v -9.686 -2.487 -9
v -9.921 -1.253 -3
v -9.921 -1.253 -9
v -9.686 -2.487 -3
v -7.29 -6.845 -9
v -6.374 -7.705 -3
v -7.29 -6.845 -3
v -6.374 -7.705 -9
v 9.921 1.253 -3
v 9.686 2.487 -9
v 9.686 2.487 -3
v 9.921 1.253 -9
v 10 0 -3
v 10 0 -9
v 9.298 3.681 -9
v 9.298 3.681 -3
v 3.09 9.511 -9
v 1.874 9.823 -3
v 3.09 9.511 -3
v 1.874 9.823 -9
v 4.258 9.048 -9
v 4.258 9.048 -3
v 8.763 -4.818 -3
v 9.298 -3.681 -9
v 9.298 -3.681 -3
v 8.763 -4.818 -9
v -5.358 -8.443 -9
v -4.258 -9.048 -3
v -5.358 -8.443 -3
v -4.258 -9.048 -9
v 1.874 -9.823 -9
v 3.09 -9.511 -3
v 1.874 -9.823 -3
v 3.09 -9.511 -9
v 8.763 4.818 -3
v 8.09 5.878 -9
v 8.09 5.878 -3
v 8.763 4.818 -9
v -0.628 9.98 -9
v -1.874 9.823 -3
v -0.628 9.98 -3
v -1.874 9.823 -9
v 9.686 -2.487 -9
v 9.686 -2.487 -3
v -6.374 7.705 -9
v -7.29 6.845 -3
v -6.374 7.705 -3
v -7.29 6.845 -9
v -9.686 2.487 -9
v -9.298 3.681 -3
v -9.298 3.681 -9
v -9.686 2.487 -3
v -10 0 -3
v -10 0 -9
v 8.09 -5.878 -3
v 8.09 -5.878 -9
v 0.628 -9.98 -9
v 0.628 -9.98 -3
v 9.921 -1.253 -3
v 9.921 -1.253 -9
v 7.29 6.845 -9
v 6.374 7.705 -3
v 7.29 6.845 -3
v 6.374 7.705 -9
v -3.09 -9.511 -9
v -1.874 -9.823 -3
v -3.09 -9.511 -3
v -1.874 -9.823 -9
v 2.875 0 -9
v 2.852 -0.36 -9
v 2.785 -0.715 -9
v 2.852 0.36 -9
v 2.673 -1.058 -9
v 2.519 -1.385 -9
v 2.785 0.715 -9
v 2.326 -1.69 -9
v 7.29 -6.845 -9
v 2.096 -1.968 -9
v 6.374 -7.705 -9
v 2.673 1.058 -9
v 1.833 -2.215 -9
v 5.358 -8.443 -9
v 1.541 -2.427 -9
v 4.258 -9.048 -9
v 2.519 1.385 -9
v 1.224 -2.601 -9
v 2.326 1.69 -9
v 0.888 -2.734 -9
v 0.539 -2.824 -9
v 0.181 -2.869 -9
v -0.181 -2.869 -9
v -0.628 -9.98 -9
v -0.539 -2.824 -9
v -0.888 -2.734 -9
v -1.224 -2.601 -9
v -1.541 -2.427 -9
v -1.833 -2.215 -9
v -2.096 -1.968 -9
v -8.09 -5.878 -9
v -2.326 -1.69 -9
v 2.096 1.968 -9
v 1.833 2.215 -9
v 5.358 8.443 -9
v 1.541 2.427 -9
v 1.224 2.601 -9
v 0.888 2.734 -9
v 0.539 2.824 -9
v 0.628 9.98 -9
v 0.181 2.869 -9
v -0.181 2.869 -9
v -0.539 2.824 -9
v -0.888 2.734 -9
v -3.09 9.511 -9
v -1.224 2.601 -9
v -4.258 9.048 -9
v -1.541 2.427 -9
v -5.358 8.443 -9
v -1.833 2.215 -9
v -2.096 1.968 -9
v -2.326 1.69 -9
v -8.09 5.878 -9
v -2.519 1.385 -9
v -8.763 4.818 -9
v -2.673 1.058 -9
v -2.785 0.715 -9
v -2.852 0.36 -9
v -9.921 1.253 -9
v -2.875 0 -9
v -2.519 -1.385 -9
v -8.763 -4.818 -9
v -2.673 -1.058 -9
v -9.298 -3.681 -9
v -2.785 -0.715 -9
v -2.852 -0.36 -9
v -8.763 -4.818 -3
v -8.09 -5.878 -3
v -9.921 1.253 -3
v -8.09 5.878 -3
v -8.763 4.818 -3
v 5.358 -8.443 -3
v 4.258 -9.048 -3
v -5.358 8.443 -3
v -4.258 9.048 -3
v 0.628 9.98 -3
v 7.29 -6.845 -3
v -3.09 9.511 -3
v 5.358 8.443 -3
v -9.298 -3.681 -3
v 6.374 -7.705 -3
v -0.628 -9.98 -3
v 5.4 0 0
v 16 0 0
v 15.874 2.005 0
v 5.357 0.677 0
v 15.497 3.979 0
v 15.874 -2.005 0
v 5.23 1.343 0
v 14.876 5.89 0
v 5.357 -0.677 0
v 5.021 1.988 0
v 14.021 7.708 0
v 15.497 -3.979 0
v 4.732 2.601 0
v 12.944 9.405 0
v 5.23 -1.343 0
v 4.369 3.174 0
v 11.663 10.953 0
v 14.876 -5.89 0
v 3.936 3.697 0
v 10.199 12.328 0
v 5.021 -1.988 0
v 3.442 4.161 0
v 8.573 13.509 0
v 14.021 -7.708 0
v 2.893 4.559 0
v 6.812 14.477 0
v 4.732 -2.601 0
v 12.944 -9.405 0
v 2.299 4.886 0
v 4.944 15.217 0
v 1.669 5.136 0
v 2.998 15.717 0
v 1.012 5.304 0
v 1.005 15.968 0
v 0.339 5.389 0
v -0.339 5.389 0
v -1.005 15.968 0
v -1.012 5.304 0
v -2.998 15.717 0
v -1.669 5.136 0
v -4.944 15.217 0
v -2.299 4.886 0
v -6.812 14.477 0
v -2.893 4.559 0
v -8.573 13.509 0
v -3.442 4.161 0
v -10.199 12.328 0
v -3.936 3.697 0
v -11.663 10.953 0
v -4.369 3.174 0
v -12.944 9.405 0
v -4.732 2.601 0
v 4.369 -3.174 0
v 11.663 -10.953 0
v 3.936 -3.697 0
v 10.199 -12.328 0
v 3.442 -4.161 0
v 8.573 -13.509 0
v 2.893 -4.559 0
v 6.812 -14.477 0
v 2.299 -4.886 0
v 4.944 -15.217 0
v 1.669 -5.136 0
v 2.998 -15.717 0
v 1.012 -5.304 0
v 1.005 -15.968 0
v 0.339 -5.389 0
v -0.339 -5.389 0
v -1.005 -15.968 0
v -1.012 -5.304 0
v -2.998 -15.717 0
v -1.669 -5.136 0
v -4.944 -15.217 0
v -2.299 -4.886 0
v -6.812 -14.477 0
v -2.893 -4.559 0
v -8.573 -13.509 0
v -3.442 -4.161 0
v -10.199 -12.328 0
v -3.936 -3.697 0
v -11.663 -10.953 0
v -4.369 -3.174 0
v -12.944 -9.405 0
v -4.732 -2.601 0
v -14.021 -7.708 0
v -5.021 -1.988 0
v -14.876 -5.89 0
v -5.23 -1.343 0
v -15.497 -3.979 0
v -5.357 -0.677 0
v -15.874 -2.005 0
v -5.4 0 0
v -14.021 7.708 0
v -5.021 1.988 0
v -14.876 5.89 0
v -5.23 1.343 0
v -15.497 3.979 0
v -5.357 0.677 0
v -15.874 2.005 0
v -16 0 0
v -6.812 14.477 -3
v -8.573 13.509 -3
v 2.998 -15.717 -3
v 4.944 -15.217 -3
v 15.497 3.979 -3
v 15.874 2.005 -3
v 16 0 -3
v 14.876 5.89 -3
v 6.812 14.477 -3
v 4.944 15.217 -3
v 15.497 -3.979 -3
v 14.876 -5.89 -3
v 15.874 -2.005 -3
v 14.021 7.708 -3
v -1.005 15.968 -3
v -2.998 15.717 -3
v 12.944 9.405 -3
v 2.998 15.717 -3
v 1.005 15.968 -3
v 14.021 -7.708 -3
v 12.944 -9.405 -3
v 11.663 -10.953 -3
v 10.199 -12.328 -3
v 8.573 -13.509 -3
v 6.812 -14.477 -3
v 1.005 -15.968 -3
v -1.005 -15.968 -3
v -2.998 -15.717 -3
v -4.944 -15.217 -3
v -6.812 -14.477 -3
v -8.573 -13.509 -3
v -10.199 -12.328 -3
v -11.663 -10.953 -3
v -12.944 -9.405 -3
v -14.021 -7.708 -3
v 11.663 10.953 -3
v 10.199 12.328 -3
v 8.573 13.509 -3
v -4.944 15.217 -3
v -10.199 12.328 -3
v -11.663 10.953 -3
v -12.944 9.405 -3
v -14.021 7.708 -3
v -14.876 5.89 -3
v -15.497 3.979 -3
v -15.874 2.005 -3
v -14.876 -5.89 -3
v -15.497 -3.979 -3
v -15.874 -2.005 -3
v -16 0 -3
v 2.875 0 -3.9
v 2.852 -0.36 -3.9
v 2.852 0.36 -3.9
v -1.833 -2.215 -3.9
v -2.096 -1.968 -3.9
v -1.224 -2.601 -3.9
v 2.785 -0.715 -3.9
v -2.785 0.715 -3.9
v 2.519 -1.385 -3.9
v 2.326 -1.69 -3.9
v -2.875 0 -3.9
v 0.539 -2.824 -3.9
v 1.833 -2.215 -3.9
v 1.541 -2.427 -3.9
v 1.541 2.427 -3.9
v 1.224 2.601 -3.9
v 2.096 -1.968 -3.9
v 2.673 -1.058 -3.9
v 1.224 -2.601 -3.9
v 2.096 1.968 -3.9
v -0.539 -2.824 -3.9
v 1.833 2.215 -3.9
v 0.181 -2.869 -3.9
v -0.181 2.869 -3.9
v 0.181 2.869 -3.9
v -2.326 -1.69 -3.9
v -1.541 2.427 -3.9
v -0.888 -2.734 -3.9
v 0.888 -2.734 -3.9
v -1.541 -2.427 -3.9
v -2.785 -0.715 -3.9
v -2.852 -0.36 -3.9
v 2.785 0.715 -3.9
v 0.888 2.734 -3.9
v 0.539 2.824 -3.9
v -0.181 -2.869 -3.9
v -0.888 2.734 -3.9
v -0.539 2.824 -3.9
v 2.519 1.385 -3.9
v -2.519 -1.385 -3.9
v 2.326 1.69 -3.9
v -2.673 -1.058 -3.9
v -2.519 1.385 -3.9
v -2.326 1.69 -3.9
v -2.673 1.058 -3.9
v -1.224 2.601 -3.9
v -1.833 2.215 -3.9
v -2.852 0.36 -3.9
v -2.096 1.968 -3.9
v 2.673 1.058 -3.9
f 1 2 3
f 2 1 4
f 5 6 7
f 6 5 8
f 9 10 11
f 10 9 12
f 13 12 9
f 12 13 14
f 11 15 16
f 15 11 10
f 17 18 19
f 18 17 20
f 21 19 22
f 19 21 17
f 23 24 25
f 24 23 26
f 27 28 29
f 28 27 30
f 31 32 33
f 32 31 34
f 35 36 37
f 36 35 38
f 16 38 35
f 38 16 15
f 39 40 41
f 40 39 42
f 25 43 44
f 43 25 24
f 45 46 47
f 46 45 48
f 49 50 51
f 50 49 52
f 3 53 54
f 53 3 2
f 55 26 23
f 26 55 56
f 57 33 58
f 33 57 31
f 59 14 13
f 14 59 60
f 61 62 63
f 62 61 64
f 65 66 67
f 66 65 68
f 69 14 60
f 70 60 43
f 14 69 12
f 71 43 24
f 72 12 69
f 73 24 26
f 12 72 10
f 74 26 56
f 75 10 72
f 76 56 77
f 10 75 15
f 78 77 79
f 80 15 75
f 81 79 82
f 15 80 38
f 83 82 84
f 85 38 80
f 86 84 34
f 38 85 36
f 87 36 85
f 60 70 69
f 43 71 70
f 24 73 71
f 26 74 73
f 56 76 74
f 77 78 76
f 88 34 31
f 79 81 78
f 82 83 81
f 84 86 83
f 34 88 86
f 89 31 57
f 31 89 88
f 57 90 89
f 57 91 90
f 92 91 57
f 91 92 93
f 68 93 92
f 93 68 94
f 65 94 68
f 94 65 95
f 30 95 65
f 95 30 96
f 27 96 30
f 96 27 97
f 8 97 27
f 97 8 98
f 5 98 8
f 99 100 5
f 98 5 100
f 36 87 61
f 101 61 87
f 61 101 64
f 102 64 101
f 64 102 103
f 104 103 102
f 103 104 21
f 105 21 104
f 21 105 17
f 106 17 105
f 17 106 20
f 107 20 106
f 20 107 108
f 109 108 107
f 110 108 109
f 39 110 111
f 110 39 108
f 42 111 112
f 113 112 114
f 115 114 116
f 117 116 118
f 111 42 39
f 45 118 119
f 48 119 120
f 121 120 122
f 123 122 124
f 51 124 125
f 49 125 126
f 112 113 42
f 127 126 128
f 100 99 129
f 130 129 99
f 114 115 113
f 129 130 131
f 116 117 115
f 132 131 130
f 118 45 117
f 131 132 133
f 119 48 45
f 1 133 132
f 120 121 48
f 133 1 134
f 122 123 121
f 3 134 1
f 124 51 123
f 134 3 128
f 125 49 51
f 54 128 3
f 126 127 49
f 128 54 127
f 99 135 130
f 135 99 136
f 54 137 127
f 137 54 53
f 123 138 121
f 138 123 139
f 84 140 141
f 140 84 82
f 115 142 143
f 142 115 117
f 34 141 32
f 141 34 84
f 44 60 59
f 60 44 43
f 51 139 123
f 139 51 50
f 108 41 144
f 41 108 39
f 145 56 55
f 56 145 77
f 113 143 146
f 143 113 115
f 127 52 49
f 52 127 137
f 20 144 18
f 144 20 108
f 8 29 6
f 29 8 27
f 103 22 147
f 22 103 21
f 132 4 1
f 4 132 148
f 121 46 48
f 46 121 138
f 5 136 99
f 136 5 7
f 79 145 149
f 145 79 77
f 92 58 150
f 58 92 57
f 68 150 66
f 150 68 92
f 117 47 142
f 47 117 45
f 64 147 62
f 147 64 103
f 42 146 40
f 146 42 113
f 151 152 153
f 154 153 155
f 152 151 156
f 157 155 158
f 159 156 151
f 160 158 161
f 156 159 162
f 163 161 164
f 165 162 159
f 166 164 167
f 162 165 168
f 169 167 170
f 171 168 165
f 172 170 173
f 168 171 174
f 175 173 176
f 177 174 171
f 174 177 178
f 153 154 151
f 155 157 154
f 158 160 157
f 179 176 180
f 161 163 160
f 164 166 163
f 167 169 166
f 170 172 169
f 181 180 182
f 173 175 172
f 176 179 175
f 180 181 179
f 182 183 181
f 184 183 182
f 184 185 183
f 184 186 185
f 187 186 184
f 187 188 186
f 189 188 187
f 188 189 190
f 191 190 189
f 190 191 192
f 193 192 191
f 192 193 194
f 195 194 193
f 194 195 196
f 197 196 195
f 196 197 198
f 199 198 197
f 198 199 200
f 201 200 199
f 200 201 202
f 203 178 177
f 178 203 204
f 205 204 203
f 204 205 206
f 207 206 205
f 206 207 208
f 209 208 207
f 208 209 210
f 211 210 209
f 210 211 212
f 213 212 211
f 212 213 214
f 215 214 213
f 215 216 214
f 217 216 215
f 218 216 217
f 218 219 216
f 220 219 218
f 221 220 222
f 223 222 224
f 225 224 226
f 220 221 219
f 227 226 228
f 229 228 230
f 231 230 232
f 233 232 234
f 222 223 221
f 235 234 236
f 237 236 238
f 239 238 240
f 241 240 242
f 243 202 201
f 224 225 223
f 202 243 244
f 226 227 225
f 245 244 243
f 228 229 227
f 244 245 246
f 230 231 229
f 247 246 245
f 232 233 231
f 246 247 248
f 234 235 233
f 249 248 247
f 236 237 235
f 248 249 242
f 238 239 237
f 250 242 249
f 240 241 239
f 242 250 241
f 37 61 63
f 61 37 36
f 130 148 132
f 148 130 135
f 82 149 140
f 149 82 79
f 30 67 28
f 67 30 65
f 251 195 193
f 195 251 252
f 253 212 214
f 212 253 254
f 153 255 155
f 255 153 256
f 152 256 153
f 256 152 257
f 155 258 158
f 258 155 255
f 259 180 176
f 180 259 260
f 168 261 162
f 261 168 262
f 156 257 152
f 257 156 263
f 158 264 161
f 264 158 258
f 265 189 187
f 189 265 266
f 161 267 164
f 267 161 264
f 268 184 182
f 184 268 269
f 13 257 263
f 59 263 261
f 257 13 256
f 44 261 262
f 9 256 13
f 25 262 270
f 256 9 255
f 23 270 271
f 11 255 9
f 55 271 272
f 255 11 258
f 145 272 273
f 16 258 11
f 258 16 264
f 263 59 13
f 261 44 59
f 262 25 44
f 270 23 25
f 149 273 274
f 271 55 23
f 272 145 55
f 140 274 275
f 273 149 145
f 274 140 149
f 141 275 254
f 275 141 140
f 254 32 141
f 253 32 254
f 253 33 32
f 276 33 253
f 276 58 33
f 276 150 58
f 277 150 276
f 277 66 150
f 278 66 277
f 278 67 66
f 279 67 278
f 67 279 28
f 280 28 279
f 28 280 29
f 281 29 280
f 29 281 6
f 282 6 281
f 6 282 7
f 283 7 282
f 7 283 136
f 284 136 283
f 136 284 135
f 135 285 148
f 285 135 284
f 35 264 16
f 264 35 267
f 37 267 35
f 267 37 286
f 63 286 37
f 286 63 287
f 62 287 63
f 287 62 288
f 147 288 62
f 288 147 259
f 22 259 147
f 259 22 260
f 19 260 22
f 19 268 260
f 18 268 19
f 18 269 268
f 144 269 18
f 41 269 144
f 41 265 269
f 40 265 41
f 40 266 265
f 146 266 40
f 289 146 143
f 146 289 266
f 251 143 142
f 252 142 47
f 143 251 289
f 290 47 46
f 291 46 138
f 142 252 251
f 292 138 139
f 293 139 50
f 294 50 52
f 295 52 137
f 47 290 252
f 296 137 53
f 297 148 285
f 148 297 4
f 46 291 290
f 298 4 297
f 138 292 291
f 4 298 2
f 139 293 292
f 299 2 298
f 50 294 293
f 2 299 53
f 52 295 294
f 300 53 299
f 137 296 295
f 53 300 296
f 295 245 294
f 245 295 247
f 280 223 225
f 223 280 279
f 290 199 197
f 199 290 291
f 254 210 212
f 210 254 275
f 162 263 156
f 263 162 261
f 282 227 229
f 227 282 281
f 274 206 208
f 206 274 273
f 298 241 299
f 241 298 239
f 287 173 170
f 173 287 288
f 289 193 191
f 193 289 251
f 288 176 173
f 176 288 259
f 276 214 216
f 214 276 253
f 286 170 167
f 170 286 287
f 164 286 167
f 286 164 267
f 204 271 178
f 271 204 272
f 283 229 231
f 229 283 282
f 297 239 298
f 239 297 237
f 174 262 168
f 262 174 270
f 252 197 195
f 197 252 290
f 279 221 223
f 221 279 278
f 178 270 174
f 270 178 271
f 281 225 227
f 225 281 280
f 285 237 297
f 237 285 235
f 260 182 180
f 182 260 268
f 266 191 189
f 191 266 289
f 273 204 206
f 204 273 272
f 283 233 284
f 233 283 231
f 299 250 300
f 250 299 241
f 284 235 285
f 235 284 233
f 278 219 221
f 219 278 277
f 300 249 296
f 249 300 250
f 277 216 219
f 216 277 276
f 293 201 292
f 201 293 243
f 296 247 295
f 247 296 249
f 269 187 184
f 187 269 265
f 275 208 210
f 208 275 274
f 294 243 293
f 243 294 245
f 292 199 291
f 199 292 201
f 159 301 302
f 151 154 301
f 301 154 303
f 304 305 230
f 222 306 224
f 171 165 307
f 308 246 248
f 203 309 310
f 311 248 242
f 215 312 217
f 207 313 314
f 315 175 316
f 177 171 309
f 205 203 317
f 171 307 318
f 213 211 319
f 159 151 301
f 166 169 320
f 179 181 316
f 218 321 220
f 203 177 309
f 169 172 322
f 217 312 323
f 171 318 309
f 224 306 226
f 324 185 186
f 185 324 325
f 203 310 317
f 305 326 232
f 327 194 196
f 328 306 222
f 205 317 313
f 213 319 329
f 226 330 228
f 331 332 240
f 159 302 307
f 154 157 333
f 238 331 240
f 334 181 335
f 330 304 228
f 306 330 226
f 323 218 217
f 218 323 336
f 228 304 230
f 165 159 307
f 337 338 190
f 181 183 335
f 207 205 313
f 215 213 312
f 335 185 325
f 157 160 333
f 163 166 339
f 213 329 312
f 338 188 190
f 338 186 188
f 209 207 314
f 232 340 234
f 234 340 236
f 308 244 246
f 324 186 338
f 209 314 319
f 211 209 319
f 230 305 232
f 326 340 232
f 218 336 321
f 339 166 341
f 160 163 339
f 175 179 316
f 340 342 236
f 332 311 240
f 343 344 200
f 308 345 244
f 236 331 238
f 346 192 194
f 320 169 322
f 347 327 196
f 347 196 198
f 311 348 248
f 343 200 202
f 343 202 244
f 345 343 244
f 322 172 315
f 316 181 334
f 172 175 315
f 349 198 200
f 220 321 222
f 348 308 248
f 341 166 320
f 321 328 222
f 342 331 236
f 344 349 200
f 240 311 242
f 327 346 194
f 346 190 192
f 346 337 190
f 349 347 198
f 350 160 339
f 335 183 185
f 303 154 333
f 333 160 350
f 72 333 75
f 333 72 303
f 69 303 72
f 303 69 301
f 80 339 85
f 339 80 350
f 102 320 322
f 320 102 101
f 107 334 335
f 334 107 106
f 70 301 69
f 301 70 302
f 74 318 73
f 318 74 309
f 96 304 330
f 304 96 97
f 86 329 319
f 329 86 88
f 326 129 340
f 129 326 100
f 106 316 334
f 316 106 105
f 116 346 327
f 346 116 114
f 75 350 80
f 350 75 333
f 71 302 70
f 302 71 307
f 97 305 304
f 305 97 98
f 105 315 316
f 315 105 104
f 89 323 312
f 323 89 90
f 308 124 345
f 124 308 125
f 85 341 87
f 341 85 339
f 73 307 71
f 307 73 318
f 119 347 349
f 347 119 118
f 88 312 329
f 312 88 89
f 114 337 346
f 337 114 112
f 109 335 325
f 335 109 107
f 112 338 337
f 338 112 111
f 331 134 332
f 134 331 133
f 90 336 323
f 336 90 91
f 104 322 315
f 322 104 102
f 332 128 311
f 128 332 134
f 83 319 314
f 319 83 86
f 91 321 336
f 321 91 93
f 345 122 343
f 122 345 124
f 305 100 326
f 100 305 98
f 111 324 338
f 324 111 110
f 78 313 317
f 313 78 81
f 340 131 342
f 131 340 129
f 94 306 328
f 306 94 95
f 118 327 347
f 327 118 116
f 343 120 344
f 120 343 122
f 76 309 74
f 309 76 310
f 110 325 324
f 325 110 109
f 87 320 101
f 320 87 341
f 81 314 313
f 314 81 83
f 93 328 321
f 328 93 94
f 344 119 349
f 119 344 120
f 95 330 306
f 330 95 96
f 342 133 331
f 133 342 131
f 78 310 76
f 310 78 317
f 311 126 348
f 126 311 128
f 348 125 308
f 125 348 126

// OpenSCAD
$fn = 50;


difference() {
	union() {
		translate(v = [0, 0, -9.0000000000]) {
			cylinder(h = 9, r = 10.0000000000);
		}
		translate(v = [0, 0, -3.0000000000]) {
			cylinder(h = 3, r = 16.0000000000);
		}
	}
	union() {
		translate(v = [0, 0, 0]) {
			rotate(a = [0, 0, 0]) {
				difference() {
					union() {
						#translate(v = [0, 0, -9.0000000000]) {
							cylinder(h = 9, r = 2.6000000000);
						}
						#translate(v = [0, 0, -3.9000000000]) {
							cylinder(h = 3.9000000000, r = 10.0000000000, r1 = 2.8750000000, r2 = 5.4000000000);
						}
						#translate(v = [0, 0, -9.0000000000]) {
							cylinder(h = 9, r = 2.8750000000);
						}
						#translate(v = [0, 0, -9.0000000000]) {
							cylinder(h = 9, r = 2.6000000000);
						}
					}
					union();
				}
			}
		}
	}
}
